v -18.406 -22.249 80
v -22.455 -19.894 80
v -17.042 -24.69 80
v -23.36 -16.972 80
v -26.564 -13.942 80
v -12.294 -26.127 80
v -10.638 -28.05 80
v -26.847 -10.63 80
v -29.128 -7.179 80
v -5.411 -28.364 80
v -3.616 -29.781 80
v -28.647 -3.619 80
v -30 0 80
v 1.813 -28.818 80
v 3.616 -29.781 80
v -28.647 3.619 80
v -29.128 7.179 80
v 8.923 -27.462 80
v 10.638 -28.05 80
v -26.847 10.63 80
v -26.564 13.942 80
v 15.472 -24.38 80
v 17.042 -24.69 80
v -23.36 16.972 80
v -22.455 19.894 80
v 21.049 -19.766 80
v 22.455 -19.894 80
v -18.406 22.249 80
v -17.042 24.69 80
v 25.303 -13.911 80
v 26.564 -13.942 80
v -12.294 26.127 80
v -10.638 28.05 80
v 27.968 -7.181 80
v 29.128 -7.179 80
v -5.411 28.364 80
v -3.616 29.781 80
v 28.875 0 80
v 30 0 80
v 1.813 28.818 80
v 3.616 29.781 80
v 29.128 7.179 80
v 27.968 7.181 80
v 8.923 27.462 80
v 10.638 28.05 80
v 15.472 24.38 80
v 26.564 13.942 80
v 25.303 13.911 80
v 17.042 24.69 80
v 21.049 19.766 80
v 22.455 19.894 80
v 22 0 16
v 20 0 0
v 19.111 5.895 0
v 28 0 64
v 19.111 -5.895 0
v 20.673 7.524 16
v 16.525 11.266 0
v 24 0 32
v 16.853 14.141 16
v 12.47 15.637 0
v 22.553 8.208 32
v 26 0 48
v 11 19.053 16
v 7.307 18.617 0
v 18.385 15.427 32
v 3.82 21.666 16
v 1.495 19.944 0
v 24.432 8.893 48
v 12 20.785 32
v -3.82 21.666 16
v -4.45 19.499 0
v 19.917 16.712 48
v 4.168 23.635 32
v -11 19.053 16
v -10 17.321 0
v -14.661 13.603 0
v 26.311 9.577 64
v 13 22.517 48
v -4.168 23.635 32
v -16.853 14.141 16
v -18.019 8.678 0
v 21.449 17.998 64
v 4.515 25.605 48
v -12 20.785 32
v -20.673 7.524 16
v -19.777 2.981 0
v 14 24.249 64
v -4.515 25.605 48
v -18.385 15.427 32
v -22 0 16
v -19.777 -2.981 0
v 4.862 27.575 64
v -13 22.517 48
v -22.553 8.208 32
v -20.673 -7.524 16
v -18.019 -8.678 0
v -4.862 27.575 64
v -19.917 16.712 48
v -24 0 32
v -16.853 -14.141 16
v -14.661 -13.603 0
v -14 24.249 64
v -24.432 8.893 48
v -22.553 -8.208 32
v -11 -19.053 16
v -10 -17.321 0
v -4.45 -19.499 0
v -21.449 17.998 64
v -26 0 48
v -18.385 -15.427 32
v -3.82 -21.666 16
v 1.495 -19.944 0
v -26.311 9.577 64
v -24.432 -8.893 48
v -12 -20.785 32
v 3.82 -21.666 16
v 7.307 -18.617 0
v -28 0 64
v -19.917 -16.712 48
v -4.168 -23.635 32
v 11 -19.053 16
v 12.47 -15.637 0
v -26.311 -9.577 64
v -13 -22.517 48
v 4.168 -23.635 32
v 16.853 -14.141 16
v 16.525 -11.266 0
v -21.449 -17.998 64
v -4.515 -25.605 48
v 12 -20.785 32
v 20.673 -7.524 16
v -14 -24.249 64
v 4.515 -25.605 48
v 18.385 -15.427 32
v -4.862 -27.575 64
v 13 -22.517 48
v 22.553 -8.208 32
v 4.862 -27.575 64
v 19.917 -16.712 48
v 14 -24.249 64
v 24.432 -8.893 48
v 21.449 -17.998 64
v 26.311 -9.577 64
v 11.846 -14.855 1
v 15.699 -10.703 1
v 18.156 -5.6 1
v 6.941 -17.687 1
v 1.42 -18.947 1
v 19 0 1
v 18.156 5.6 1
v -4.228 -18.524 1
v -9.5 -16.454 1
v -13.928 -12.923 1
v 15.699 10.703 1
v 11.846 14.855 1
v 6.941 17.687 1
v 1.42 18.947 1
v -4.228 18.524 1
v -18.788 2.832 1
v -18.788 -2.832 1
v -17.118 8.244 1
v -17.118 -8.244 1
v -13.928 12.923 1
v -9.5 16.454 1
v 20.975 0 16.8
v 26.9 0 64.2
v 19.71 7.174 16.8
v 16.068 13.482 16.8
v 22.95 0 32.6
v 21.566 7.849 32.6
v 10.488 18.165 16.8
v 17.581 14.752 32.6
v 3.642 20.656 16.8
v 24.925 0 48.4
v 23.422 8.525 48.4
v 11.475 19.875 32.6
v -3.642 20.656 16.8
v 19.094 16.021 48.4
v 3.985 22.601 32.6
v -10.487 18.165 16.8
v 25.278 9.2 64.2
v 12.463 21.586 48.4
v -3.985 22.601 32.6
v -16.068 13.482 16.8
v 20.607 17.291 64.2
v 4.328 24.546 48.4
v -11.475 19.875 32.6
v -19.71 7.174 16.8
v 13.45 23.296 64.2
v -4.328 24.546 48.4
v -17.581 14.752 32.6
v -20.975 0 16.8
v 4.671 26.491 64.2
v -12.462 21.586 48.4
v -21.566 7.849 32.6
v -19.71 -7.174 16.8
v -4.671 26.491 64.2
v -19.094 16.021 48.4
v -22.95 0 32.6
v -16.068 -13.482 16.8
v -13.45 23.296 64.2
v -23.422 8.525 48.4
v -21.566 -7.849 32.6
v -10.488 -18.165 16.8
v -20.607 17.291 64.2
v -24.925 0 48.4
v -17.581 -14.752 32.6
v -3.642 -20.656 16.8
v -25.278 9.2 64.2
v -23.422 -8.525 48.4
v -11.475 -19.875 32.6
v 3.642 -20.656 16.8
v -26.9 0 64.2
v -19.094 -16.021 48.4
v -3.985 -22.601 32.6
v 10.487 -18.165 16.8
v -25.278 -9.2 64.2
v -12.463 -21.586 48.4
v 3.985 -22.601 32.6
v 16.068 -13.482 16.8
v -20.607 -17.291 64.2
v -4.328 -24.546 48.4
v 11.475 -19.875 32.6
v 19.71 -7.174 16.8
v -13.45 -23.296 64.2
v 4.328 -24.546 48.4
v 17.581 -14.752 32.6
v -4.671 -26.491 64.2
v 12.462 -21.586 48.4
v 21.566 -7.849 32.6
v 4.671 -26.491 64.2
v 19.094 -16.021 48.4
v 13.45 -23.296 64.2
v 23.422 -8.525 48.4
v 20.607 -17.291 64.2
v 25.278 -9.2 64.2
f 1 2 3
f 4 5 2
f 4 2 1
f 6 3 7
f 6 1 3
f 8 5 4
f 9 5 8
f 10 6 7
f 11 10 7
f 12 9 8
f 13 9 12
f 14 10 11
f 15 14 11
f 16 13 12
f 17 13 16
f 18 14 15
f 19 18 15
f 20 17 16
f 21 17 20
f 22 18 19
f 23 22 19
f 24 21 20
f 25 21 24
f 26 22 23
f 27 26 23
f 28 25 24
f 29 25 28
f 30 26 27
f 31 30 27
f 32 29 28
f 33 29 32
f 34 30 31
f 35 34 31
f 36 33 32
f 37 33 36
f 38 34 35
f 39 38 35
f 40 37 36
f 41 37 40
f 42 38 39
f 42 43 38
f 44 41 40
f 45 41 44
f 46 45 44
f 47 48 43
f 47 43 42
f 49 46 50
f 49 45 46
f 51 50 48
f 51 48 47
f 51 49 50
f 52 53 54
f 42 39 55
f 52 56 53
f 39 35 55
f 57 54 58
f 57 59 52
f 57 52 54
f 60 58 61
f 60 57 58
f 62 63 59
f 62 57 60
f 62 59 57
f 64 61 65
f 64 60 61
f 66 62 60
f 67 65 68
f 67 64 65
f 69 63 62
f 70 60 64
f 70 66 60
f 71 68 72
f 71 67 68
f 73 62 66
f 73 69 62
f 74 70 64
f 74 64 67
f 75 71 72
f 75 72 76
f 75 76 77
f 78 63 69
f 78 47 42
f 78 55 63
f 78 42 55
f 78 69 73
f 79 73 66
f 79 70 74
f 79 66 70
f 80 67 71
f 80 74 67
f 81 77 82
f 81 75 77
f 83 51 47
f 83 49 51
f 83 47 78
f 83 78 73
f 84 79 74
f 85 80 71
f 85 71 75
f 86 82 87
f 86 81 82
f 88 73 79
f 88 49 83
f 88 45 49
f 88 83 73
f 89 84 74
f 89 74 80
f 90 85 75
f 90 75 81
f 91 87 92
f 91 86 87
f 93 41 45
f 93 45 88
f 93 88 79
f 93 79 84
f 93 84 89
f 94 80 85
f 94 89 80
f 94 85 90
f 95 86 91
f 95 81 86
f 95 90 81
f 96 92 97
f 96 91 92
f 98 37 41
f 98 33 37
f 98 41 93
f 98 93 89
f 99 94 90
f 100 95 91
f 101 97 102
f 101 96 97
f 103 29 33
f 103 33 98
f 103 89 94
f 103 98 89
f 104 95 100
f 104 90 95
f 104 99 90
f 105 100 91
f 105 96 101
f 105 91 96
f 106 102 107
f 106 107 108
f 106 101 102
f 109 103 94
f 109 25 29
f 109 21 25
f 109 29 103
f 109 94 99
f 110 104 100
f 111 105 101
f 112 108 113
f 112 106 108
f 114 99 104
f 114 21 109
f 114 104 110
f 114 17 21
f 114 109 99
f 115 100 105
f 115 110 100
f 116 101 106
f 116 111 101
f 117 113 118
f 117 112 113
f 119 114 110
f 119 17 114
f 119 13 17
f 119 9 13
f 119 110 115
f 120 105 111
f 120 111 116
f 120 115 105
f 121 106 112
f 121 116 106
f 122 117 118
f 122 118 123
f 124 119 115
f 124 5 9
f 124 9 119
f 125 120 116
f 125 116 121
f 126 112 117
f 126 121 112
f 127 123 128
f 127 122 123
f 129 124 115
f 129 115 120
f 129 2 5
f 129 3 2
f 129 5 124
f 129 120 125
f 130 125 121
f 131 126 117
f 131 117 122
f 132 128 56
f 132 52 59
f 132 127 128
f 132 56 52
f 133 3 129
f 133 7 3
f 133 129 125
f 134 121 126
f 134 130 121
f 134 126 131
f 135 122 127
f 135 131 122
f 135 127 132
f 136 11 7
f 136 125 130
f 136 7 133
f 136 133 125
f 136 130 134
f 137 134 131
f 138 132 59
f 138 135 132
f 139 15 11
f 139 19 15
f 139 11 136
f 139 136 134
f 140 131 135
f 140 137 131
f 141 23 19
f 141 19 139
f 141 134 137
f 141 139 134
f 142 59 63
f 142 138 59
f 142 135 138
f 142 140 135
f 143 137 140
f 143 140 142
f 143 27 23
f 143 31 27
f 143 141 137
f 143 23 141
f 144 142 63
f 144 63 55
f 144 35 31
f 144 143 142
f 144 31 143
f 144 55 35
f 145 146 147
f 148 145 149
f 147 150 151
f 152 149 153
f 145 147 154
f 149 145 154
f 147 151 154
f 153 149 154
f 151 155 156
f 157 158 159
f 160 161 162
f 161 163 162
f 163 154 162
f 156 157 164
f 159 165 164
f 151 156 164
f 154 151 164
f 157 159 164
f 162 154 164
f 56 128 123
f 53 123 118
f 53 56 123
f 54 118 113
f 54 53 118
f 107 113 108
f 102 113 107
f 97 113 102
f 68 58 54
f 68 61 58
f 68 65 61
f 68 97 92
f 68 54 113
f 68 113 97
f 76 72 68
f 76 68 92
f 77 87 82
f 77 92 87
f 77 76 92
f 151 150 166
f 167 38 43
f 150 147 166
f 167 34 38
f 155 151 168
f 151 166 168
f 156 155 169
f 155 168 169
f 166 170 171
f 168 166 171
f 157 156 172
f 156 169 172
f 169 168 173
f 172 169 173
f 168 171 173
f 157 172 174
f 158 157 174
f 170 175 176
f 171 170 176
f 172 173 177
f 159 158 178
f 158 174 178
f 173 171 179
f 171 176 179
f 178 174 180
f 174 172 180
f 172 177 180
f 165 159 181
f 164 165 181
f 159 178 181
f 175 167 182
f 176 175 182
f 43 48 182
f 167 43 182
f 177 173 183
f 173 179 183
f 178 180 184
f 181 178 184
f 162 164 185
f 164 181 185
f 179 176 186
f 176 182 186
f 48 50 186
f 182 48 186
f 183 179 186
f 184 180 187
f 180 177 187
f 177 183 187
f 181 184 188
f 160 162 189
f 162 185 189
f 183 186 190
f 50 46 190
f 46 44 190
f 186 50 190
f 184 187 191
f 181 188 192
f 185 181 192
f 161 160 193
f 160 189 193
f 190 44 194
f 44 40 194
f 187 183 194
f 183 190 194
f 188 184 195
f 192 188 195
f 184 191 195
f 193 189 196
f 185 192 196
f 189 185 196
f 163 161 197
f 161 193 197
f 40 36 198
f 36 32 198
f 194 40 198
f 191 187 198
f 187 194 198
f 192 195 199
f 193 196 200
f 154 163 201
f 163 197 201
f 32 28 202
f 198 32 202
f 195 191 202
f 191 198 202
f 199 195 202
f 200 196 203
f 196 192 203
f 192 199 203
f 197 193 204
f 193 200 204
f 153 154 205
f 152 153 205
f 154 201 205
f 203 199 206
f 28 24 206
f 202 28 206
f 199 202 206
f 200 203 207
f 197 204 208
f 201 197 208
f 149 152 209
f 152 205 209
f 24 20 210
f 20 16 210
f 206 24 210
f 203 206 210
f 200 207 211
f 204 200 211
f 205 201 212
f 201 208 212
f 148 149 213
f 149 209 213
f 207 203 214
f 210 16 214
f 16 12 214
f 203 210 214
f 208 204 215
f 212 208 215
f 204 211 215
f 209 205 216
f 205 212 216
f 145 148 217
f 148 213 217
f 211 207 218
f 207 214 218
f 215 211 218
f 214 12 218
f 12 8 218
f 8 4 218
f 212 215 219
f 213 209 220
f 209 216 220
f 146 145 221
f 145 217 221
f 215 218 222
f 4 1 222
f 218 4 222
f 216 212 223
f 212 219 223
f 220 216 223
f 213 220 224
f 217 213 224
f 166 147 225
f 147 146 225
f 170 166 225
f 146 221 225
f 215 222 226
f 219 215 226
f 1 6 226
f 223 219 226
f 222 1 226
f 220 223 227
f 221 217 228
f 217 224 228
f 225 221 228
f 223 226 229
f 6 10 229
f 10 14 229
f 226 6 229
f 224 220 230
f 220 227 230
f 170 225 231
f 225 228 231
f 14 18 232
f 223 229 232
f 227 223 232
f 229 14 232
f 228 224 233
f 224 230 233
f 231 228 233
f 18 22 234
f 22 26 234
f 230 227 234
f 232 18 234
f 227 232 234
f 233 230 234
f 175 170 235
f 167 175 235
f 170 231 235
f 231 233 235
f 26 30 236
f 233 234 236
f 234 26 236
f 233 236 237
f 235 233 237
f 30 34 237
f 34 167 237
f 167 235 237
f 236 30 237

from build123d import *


with BuildPart() as cono001:
    # Cone001 → Cone001 (revolve)
    with BuildSketch(Plane(origin=(0, 0, 1), x_dir=(1, 0, 0), z_dir=(0, -1, 0))):
        Polygon((0, 0), (19, 0), (29, 80), (0, 80), align=None)
    revolve(axis=Axis((0, 0, 1), (0, 0, 1)))


with BuildPart() as cut:
    # Cone → Cone (revolve)
    with BuildSketch(Plane.XZ):
        Polygon((0, 0), (20, 0), (30, 80), (0, 80), align=None)
    revolve(axis=Axis((0, 0, 0), (0, 0, 1)))

    # Cut: cut Cono001
    add(cono001.part, mode=Mode.SUBTRACT)


solid = cut.part
